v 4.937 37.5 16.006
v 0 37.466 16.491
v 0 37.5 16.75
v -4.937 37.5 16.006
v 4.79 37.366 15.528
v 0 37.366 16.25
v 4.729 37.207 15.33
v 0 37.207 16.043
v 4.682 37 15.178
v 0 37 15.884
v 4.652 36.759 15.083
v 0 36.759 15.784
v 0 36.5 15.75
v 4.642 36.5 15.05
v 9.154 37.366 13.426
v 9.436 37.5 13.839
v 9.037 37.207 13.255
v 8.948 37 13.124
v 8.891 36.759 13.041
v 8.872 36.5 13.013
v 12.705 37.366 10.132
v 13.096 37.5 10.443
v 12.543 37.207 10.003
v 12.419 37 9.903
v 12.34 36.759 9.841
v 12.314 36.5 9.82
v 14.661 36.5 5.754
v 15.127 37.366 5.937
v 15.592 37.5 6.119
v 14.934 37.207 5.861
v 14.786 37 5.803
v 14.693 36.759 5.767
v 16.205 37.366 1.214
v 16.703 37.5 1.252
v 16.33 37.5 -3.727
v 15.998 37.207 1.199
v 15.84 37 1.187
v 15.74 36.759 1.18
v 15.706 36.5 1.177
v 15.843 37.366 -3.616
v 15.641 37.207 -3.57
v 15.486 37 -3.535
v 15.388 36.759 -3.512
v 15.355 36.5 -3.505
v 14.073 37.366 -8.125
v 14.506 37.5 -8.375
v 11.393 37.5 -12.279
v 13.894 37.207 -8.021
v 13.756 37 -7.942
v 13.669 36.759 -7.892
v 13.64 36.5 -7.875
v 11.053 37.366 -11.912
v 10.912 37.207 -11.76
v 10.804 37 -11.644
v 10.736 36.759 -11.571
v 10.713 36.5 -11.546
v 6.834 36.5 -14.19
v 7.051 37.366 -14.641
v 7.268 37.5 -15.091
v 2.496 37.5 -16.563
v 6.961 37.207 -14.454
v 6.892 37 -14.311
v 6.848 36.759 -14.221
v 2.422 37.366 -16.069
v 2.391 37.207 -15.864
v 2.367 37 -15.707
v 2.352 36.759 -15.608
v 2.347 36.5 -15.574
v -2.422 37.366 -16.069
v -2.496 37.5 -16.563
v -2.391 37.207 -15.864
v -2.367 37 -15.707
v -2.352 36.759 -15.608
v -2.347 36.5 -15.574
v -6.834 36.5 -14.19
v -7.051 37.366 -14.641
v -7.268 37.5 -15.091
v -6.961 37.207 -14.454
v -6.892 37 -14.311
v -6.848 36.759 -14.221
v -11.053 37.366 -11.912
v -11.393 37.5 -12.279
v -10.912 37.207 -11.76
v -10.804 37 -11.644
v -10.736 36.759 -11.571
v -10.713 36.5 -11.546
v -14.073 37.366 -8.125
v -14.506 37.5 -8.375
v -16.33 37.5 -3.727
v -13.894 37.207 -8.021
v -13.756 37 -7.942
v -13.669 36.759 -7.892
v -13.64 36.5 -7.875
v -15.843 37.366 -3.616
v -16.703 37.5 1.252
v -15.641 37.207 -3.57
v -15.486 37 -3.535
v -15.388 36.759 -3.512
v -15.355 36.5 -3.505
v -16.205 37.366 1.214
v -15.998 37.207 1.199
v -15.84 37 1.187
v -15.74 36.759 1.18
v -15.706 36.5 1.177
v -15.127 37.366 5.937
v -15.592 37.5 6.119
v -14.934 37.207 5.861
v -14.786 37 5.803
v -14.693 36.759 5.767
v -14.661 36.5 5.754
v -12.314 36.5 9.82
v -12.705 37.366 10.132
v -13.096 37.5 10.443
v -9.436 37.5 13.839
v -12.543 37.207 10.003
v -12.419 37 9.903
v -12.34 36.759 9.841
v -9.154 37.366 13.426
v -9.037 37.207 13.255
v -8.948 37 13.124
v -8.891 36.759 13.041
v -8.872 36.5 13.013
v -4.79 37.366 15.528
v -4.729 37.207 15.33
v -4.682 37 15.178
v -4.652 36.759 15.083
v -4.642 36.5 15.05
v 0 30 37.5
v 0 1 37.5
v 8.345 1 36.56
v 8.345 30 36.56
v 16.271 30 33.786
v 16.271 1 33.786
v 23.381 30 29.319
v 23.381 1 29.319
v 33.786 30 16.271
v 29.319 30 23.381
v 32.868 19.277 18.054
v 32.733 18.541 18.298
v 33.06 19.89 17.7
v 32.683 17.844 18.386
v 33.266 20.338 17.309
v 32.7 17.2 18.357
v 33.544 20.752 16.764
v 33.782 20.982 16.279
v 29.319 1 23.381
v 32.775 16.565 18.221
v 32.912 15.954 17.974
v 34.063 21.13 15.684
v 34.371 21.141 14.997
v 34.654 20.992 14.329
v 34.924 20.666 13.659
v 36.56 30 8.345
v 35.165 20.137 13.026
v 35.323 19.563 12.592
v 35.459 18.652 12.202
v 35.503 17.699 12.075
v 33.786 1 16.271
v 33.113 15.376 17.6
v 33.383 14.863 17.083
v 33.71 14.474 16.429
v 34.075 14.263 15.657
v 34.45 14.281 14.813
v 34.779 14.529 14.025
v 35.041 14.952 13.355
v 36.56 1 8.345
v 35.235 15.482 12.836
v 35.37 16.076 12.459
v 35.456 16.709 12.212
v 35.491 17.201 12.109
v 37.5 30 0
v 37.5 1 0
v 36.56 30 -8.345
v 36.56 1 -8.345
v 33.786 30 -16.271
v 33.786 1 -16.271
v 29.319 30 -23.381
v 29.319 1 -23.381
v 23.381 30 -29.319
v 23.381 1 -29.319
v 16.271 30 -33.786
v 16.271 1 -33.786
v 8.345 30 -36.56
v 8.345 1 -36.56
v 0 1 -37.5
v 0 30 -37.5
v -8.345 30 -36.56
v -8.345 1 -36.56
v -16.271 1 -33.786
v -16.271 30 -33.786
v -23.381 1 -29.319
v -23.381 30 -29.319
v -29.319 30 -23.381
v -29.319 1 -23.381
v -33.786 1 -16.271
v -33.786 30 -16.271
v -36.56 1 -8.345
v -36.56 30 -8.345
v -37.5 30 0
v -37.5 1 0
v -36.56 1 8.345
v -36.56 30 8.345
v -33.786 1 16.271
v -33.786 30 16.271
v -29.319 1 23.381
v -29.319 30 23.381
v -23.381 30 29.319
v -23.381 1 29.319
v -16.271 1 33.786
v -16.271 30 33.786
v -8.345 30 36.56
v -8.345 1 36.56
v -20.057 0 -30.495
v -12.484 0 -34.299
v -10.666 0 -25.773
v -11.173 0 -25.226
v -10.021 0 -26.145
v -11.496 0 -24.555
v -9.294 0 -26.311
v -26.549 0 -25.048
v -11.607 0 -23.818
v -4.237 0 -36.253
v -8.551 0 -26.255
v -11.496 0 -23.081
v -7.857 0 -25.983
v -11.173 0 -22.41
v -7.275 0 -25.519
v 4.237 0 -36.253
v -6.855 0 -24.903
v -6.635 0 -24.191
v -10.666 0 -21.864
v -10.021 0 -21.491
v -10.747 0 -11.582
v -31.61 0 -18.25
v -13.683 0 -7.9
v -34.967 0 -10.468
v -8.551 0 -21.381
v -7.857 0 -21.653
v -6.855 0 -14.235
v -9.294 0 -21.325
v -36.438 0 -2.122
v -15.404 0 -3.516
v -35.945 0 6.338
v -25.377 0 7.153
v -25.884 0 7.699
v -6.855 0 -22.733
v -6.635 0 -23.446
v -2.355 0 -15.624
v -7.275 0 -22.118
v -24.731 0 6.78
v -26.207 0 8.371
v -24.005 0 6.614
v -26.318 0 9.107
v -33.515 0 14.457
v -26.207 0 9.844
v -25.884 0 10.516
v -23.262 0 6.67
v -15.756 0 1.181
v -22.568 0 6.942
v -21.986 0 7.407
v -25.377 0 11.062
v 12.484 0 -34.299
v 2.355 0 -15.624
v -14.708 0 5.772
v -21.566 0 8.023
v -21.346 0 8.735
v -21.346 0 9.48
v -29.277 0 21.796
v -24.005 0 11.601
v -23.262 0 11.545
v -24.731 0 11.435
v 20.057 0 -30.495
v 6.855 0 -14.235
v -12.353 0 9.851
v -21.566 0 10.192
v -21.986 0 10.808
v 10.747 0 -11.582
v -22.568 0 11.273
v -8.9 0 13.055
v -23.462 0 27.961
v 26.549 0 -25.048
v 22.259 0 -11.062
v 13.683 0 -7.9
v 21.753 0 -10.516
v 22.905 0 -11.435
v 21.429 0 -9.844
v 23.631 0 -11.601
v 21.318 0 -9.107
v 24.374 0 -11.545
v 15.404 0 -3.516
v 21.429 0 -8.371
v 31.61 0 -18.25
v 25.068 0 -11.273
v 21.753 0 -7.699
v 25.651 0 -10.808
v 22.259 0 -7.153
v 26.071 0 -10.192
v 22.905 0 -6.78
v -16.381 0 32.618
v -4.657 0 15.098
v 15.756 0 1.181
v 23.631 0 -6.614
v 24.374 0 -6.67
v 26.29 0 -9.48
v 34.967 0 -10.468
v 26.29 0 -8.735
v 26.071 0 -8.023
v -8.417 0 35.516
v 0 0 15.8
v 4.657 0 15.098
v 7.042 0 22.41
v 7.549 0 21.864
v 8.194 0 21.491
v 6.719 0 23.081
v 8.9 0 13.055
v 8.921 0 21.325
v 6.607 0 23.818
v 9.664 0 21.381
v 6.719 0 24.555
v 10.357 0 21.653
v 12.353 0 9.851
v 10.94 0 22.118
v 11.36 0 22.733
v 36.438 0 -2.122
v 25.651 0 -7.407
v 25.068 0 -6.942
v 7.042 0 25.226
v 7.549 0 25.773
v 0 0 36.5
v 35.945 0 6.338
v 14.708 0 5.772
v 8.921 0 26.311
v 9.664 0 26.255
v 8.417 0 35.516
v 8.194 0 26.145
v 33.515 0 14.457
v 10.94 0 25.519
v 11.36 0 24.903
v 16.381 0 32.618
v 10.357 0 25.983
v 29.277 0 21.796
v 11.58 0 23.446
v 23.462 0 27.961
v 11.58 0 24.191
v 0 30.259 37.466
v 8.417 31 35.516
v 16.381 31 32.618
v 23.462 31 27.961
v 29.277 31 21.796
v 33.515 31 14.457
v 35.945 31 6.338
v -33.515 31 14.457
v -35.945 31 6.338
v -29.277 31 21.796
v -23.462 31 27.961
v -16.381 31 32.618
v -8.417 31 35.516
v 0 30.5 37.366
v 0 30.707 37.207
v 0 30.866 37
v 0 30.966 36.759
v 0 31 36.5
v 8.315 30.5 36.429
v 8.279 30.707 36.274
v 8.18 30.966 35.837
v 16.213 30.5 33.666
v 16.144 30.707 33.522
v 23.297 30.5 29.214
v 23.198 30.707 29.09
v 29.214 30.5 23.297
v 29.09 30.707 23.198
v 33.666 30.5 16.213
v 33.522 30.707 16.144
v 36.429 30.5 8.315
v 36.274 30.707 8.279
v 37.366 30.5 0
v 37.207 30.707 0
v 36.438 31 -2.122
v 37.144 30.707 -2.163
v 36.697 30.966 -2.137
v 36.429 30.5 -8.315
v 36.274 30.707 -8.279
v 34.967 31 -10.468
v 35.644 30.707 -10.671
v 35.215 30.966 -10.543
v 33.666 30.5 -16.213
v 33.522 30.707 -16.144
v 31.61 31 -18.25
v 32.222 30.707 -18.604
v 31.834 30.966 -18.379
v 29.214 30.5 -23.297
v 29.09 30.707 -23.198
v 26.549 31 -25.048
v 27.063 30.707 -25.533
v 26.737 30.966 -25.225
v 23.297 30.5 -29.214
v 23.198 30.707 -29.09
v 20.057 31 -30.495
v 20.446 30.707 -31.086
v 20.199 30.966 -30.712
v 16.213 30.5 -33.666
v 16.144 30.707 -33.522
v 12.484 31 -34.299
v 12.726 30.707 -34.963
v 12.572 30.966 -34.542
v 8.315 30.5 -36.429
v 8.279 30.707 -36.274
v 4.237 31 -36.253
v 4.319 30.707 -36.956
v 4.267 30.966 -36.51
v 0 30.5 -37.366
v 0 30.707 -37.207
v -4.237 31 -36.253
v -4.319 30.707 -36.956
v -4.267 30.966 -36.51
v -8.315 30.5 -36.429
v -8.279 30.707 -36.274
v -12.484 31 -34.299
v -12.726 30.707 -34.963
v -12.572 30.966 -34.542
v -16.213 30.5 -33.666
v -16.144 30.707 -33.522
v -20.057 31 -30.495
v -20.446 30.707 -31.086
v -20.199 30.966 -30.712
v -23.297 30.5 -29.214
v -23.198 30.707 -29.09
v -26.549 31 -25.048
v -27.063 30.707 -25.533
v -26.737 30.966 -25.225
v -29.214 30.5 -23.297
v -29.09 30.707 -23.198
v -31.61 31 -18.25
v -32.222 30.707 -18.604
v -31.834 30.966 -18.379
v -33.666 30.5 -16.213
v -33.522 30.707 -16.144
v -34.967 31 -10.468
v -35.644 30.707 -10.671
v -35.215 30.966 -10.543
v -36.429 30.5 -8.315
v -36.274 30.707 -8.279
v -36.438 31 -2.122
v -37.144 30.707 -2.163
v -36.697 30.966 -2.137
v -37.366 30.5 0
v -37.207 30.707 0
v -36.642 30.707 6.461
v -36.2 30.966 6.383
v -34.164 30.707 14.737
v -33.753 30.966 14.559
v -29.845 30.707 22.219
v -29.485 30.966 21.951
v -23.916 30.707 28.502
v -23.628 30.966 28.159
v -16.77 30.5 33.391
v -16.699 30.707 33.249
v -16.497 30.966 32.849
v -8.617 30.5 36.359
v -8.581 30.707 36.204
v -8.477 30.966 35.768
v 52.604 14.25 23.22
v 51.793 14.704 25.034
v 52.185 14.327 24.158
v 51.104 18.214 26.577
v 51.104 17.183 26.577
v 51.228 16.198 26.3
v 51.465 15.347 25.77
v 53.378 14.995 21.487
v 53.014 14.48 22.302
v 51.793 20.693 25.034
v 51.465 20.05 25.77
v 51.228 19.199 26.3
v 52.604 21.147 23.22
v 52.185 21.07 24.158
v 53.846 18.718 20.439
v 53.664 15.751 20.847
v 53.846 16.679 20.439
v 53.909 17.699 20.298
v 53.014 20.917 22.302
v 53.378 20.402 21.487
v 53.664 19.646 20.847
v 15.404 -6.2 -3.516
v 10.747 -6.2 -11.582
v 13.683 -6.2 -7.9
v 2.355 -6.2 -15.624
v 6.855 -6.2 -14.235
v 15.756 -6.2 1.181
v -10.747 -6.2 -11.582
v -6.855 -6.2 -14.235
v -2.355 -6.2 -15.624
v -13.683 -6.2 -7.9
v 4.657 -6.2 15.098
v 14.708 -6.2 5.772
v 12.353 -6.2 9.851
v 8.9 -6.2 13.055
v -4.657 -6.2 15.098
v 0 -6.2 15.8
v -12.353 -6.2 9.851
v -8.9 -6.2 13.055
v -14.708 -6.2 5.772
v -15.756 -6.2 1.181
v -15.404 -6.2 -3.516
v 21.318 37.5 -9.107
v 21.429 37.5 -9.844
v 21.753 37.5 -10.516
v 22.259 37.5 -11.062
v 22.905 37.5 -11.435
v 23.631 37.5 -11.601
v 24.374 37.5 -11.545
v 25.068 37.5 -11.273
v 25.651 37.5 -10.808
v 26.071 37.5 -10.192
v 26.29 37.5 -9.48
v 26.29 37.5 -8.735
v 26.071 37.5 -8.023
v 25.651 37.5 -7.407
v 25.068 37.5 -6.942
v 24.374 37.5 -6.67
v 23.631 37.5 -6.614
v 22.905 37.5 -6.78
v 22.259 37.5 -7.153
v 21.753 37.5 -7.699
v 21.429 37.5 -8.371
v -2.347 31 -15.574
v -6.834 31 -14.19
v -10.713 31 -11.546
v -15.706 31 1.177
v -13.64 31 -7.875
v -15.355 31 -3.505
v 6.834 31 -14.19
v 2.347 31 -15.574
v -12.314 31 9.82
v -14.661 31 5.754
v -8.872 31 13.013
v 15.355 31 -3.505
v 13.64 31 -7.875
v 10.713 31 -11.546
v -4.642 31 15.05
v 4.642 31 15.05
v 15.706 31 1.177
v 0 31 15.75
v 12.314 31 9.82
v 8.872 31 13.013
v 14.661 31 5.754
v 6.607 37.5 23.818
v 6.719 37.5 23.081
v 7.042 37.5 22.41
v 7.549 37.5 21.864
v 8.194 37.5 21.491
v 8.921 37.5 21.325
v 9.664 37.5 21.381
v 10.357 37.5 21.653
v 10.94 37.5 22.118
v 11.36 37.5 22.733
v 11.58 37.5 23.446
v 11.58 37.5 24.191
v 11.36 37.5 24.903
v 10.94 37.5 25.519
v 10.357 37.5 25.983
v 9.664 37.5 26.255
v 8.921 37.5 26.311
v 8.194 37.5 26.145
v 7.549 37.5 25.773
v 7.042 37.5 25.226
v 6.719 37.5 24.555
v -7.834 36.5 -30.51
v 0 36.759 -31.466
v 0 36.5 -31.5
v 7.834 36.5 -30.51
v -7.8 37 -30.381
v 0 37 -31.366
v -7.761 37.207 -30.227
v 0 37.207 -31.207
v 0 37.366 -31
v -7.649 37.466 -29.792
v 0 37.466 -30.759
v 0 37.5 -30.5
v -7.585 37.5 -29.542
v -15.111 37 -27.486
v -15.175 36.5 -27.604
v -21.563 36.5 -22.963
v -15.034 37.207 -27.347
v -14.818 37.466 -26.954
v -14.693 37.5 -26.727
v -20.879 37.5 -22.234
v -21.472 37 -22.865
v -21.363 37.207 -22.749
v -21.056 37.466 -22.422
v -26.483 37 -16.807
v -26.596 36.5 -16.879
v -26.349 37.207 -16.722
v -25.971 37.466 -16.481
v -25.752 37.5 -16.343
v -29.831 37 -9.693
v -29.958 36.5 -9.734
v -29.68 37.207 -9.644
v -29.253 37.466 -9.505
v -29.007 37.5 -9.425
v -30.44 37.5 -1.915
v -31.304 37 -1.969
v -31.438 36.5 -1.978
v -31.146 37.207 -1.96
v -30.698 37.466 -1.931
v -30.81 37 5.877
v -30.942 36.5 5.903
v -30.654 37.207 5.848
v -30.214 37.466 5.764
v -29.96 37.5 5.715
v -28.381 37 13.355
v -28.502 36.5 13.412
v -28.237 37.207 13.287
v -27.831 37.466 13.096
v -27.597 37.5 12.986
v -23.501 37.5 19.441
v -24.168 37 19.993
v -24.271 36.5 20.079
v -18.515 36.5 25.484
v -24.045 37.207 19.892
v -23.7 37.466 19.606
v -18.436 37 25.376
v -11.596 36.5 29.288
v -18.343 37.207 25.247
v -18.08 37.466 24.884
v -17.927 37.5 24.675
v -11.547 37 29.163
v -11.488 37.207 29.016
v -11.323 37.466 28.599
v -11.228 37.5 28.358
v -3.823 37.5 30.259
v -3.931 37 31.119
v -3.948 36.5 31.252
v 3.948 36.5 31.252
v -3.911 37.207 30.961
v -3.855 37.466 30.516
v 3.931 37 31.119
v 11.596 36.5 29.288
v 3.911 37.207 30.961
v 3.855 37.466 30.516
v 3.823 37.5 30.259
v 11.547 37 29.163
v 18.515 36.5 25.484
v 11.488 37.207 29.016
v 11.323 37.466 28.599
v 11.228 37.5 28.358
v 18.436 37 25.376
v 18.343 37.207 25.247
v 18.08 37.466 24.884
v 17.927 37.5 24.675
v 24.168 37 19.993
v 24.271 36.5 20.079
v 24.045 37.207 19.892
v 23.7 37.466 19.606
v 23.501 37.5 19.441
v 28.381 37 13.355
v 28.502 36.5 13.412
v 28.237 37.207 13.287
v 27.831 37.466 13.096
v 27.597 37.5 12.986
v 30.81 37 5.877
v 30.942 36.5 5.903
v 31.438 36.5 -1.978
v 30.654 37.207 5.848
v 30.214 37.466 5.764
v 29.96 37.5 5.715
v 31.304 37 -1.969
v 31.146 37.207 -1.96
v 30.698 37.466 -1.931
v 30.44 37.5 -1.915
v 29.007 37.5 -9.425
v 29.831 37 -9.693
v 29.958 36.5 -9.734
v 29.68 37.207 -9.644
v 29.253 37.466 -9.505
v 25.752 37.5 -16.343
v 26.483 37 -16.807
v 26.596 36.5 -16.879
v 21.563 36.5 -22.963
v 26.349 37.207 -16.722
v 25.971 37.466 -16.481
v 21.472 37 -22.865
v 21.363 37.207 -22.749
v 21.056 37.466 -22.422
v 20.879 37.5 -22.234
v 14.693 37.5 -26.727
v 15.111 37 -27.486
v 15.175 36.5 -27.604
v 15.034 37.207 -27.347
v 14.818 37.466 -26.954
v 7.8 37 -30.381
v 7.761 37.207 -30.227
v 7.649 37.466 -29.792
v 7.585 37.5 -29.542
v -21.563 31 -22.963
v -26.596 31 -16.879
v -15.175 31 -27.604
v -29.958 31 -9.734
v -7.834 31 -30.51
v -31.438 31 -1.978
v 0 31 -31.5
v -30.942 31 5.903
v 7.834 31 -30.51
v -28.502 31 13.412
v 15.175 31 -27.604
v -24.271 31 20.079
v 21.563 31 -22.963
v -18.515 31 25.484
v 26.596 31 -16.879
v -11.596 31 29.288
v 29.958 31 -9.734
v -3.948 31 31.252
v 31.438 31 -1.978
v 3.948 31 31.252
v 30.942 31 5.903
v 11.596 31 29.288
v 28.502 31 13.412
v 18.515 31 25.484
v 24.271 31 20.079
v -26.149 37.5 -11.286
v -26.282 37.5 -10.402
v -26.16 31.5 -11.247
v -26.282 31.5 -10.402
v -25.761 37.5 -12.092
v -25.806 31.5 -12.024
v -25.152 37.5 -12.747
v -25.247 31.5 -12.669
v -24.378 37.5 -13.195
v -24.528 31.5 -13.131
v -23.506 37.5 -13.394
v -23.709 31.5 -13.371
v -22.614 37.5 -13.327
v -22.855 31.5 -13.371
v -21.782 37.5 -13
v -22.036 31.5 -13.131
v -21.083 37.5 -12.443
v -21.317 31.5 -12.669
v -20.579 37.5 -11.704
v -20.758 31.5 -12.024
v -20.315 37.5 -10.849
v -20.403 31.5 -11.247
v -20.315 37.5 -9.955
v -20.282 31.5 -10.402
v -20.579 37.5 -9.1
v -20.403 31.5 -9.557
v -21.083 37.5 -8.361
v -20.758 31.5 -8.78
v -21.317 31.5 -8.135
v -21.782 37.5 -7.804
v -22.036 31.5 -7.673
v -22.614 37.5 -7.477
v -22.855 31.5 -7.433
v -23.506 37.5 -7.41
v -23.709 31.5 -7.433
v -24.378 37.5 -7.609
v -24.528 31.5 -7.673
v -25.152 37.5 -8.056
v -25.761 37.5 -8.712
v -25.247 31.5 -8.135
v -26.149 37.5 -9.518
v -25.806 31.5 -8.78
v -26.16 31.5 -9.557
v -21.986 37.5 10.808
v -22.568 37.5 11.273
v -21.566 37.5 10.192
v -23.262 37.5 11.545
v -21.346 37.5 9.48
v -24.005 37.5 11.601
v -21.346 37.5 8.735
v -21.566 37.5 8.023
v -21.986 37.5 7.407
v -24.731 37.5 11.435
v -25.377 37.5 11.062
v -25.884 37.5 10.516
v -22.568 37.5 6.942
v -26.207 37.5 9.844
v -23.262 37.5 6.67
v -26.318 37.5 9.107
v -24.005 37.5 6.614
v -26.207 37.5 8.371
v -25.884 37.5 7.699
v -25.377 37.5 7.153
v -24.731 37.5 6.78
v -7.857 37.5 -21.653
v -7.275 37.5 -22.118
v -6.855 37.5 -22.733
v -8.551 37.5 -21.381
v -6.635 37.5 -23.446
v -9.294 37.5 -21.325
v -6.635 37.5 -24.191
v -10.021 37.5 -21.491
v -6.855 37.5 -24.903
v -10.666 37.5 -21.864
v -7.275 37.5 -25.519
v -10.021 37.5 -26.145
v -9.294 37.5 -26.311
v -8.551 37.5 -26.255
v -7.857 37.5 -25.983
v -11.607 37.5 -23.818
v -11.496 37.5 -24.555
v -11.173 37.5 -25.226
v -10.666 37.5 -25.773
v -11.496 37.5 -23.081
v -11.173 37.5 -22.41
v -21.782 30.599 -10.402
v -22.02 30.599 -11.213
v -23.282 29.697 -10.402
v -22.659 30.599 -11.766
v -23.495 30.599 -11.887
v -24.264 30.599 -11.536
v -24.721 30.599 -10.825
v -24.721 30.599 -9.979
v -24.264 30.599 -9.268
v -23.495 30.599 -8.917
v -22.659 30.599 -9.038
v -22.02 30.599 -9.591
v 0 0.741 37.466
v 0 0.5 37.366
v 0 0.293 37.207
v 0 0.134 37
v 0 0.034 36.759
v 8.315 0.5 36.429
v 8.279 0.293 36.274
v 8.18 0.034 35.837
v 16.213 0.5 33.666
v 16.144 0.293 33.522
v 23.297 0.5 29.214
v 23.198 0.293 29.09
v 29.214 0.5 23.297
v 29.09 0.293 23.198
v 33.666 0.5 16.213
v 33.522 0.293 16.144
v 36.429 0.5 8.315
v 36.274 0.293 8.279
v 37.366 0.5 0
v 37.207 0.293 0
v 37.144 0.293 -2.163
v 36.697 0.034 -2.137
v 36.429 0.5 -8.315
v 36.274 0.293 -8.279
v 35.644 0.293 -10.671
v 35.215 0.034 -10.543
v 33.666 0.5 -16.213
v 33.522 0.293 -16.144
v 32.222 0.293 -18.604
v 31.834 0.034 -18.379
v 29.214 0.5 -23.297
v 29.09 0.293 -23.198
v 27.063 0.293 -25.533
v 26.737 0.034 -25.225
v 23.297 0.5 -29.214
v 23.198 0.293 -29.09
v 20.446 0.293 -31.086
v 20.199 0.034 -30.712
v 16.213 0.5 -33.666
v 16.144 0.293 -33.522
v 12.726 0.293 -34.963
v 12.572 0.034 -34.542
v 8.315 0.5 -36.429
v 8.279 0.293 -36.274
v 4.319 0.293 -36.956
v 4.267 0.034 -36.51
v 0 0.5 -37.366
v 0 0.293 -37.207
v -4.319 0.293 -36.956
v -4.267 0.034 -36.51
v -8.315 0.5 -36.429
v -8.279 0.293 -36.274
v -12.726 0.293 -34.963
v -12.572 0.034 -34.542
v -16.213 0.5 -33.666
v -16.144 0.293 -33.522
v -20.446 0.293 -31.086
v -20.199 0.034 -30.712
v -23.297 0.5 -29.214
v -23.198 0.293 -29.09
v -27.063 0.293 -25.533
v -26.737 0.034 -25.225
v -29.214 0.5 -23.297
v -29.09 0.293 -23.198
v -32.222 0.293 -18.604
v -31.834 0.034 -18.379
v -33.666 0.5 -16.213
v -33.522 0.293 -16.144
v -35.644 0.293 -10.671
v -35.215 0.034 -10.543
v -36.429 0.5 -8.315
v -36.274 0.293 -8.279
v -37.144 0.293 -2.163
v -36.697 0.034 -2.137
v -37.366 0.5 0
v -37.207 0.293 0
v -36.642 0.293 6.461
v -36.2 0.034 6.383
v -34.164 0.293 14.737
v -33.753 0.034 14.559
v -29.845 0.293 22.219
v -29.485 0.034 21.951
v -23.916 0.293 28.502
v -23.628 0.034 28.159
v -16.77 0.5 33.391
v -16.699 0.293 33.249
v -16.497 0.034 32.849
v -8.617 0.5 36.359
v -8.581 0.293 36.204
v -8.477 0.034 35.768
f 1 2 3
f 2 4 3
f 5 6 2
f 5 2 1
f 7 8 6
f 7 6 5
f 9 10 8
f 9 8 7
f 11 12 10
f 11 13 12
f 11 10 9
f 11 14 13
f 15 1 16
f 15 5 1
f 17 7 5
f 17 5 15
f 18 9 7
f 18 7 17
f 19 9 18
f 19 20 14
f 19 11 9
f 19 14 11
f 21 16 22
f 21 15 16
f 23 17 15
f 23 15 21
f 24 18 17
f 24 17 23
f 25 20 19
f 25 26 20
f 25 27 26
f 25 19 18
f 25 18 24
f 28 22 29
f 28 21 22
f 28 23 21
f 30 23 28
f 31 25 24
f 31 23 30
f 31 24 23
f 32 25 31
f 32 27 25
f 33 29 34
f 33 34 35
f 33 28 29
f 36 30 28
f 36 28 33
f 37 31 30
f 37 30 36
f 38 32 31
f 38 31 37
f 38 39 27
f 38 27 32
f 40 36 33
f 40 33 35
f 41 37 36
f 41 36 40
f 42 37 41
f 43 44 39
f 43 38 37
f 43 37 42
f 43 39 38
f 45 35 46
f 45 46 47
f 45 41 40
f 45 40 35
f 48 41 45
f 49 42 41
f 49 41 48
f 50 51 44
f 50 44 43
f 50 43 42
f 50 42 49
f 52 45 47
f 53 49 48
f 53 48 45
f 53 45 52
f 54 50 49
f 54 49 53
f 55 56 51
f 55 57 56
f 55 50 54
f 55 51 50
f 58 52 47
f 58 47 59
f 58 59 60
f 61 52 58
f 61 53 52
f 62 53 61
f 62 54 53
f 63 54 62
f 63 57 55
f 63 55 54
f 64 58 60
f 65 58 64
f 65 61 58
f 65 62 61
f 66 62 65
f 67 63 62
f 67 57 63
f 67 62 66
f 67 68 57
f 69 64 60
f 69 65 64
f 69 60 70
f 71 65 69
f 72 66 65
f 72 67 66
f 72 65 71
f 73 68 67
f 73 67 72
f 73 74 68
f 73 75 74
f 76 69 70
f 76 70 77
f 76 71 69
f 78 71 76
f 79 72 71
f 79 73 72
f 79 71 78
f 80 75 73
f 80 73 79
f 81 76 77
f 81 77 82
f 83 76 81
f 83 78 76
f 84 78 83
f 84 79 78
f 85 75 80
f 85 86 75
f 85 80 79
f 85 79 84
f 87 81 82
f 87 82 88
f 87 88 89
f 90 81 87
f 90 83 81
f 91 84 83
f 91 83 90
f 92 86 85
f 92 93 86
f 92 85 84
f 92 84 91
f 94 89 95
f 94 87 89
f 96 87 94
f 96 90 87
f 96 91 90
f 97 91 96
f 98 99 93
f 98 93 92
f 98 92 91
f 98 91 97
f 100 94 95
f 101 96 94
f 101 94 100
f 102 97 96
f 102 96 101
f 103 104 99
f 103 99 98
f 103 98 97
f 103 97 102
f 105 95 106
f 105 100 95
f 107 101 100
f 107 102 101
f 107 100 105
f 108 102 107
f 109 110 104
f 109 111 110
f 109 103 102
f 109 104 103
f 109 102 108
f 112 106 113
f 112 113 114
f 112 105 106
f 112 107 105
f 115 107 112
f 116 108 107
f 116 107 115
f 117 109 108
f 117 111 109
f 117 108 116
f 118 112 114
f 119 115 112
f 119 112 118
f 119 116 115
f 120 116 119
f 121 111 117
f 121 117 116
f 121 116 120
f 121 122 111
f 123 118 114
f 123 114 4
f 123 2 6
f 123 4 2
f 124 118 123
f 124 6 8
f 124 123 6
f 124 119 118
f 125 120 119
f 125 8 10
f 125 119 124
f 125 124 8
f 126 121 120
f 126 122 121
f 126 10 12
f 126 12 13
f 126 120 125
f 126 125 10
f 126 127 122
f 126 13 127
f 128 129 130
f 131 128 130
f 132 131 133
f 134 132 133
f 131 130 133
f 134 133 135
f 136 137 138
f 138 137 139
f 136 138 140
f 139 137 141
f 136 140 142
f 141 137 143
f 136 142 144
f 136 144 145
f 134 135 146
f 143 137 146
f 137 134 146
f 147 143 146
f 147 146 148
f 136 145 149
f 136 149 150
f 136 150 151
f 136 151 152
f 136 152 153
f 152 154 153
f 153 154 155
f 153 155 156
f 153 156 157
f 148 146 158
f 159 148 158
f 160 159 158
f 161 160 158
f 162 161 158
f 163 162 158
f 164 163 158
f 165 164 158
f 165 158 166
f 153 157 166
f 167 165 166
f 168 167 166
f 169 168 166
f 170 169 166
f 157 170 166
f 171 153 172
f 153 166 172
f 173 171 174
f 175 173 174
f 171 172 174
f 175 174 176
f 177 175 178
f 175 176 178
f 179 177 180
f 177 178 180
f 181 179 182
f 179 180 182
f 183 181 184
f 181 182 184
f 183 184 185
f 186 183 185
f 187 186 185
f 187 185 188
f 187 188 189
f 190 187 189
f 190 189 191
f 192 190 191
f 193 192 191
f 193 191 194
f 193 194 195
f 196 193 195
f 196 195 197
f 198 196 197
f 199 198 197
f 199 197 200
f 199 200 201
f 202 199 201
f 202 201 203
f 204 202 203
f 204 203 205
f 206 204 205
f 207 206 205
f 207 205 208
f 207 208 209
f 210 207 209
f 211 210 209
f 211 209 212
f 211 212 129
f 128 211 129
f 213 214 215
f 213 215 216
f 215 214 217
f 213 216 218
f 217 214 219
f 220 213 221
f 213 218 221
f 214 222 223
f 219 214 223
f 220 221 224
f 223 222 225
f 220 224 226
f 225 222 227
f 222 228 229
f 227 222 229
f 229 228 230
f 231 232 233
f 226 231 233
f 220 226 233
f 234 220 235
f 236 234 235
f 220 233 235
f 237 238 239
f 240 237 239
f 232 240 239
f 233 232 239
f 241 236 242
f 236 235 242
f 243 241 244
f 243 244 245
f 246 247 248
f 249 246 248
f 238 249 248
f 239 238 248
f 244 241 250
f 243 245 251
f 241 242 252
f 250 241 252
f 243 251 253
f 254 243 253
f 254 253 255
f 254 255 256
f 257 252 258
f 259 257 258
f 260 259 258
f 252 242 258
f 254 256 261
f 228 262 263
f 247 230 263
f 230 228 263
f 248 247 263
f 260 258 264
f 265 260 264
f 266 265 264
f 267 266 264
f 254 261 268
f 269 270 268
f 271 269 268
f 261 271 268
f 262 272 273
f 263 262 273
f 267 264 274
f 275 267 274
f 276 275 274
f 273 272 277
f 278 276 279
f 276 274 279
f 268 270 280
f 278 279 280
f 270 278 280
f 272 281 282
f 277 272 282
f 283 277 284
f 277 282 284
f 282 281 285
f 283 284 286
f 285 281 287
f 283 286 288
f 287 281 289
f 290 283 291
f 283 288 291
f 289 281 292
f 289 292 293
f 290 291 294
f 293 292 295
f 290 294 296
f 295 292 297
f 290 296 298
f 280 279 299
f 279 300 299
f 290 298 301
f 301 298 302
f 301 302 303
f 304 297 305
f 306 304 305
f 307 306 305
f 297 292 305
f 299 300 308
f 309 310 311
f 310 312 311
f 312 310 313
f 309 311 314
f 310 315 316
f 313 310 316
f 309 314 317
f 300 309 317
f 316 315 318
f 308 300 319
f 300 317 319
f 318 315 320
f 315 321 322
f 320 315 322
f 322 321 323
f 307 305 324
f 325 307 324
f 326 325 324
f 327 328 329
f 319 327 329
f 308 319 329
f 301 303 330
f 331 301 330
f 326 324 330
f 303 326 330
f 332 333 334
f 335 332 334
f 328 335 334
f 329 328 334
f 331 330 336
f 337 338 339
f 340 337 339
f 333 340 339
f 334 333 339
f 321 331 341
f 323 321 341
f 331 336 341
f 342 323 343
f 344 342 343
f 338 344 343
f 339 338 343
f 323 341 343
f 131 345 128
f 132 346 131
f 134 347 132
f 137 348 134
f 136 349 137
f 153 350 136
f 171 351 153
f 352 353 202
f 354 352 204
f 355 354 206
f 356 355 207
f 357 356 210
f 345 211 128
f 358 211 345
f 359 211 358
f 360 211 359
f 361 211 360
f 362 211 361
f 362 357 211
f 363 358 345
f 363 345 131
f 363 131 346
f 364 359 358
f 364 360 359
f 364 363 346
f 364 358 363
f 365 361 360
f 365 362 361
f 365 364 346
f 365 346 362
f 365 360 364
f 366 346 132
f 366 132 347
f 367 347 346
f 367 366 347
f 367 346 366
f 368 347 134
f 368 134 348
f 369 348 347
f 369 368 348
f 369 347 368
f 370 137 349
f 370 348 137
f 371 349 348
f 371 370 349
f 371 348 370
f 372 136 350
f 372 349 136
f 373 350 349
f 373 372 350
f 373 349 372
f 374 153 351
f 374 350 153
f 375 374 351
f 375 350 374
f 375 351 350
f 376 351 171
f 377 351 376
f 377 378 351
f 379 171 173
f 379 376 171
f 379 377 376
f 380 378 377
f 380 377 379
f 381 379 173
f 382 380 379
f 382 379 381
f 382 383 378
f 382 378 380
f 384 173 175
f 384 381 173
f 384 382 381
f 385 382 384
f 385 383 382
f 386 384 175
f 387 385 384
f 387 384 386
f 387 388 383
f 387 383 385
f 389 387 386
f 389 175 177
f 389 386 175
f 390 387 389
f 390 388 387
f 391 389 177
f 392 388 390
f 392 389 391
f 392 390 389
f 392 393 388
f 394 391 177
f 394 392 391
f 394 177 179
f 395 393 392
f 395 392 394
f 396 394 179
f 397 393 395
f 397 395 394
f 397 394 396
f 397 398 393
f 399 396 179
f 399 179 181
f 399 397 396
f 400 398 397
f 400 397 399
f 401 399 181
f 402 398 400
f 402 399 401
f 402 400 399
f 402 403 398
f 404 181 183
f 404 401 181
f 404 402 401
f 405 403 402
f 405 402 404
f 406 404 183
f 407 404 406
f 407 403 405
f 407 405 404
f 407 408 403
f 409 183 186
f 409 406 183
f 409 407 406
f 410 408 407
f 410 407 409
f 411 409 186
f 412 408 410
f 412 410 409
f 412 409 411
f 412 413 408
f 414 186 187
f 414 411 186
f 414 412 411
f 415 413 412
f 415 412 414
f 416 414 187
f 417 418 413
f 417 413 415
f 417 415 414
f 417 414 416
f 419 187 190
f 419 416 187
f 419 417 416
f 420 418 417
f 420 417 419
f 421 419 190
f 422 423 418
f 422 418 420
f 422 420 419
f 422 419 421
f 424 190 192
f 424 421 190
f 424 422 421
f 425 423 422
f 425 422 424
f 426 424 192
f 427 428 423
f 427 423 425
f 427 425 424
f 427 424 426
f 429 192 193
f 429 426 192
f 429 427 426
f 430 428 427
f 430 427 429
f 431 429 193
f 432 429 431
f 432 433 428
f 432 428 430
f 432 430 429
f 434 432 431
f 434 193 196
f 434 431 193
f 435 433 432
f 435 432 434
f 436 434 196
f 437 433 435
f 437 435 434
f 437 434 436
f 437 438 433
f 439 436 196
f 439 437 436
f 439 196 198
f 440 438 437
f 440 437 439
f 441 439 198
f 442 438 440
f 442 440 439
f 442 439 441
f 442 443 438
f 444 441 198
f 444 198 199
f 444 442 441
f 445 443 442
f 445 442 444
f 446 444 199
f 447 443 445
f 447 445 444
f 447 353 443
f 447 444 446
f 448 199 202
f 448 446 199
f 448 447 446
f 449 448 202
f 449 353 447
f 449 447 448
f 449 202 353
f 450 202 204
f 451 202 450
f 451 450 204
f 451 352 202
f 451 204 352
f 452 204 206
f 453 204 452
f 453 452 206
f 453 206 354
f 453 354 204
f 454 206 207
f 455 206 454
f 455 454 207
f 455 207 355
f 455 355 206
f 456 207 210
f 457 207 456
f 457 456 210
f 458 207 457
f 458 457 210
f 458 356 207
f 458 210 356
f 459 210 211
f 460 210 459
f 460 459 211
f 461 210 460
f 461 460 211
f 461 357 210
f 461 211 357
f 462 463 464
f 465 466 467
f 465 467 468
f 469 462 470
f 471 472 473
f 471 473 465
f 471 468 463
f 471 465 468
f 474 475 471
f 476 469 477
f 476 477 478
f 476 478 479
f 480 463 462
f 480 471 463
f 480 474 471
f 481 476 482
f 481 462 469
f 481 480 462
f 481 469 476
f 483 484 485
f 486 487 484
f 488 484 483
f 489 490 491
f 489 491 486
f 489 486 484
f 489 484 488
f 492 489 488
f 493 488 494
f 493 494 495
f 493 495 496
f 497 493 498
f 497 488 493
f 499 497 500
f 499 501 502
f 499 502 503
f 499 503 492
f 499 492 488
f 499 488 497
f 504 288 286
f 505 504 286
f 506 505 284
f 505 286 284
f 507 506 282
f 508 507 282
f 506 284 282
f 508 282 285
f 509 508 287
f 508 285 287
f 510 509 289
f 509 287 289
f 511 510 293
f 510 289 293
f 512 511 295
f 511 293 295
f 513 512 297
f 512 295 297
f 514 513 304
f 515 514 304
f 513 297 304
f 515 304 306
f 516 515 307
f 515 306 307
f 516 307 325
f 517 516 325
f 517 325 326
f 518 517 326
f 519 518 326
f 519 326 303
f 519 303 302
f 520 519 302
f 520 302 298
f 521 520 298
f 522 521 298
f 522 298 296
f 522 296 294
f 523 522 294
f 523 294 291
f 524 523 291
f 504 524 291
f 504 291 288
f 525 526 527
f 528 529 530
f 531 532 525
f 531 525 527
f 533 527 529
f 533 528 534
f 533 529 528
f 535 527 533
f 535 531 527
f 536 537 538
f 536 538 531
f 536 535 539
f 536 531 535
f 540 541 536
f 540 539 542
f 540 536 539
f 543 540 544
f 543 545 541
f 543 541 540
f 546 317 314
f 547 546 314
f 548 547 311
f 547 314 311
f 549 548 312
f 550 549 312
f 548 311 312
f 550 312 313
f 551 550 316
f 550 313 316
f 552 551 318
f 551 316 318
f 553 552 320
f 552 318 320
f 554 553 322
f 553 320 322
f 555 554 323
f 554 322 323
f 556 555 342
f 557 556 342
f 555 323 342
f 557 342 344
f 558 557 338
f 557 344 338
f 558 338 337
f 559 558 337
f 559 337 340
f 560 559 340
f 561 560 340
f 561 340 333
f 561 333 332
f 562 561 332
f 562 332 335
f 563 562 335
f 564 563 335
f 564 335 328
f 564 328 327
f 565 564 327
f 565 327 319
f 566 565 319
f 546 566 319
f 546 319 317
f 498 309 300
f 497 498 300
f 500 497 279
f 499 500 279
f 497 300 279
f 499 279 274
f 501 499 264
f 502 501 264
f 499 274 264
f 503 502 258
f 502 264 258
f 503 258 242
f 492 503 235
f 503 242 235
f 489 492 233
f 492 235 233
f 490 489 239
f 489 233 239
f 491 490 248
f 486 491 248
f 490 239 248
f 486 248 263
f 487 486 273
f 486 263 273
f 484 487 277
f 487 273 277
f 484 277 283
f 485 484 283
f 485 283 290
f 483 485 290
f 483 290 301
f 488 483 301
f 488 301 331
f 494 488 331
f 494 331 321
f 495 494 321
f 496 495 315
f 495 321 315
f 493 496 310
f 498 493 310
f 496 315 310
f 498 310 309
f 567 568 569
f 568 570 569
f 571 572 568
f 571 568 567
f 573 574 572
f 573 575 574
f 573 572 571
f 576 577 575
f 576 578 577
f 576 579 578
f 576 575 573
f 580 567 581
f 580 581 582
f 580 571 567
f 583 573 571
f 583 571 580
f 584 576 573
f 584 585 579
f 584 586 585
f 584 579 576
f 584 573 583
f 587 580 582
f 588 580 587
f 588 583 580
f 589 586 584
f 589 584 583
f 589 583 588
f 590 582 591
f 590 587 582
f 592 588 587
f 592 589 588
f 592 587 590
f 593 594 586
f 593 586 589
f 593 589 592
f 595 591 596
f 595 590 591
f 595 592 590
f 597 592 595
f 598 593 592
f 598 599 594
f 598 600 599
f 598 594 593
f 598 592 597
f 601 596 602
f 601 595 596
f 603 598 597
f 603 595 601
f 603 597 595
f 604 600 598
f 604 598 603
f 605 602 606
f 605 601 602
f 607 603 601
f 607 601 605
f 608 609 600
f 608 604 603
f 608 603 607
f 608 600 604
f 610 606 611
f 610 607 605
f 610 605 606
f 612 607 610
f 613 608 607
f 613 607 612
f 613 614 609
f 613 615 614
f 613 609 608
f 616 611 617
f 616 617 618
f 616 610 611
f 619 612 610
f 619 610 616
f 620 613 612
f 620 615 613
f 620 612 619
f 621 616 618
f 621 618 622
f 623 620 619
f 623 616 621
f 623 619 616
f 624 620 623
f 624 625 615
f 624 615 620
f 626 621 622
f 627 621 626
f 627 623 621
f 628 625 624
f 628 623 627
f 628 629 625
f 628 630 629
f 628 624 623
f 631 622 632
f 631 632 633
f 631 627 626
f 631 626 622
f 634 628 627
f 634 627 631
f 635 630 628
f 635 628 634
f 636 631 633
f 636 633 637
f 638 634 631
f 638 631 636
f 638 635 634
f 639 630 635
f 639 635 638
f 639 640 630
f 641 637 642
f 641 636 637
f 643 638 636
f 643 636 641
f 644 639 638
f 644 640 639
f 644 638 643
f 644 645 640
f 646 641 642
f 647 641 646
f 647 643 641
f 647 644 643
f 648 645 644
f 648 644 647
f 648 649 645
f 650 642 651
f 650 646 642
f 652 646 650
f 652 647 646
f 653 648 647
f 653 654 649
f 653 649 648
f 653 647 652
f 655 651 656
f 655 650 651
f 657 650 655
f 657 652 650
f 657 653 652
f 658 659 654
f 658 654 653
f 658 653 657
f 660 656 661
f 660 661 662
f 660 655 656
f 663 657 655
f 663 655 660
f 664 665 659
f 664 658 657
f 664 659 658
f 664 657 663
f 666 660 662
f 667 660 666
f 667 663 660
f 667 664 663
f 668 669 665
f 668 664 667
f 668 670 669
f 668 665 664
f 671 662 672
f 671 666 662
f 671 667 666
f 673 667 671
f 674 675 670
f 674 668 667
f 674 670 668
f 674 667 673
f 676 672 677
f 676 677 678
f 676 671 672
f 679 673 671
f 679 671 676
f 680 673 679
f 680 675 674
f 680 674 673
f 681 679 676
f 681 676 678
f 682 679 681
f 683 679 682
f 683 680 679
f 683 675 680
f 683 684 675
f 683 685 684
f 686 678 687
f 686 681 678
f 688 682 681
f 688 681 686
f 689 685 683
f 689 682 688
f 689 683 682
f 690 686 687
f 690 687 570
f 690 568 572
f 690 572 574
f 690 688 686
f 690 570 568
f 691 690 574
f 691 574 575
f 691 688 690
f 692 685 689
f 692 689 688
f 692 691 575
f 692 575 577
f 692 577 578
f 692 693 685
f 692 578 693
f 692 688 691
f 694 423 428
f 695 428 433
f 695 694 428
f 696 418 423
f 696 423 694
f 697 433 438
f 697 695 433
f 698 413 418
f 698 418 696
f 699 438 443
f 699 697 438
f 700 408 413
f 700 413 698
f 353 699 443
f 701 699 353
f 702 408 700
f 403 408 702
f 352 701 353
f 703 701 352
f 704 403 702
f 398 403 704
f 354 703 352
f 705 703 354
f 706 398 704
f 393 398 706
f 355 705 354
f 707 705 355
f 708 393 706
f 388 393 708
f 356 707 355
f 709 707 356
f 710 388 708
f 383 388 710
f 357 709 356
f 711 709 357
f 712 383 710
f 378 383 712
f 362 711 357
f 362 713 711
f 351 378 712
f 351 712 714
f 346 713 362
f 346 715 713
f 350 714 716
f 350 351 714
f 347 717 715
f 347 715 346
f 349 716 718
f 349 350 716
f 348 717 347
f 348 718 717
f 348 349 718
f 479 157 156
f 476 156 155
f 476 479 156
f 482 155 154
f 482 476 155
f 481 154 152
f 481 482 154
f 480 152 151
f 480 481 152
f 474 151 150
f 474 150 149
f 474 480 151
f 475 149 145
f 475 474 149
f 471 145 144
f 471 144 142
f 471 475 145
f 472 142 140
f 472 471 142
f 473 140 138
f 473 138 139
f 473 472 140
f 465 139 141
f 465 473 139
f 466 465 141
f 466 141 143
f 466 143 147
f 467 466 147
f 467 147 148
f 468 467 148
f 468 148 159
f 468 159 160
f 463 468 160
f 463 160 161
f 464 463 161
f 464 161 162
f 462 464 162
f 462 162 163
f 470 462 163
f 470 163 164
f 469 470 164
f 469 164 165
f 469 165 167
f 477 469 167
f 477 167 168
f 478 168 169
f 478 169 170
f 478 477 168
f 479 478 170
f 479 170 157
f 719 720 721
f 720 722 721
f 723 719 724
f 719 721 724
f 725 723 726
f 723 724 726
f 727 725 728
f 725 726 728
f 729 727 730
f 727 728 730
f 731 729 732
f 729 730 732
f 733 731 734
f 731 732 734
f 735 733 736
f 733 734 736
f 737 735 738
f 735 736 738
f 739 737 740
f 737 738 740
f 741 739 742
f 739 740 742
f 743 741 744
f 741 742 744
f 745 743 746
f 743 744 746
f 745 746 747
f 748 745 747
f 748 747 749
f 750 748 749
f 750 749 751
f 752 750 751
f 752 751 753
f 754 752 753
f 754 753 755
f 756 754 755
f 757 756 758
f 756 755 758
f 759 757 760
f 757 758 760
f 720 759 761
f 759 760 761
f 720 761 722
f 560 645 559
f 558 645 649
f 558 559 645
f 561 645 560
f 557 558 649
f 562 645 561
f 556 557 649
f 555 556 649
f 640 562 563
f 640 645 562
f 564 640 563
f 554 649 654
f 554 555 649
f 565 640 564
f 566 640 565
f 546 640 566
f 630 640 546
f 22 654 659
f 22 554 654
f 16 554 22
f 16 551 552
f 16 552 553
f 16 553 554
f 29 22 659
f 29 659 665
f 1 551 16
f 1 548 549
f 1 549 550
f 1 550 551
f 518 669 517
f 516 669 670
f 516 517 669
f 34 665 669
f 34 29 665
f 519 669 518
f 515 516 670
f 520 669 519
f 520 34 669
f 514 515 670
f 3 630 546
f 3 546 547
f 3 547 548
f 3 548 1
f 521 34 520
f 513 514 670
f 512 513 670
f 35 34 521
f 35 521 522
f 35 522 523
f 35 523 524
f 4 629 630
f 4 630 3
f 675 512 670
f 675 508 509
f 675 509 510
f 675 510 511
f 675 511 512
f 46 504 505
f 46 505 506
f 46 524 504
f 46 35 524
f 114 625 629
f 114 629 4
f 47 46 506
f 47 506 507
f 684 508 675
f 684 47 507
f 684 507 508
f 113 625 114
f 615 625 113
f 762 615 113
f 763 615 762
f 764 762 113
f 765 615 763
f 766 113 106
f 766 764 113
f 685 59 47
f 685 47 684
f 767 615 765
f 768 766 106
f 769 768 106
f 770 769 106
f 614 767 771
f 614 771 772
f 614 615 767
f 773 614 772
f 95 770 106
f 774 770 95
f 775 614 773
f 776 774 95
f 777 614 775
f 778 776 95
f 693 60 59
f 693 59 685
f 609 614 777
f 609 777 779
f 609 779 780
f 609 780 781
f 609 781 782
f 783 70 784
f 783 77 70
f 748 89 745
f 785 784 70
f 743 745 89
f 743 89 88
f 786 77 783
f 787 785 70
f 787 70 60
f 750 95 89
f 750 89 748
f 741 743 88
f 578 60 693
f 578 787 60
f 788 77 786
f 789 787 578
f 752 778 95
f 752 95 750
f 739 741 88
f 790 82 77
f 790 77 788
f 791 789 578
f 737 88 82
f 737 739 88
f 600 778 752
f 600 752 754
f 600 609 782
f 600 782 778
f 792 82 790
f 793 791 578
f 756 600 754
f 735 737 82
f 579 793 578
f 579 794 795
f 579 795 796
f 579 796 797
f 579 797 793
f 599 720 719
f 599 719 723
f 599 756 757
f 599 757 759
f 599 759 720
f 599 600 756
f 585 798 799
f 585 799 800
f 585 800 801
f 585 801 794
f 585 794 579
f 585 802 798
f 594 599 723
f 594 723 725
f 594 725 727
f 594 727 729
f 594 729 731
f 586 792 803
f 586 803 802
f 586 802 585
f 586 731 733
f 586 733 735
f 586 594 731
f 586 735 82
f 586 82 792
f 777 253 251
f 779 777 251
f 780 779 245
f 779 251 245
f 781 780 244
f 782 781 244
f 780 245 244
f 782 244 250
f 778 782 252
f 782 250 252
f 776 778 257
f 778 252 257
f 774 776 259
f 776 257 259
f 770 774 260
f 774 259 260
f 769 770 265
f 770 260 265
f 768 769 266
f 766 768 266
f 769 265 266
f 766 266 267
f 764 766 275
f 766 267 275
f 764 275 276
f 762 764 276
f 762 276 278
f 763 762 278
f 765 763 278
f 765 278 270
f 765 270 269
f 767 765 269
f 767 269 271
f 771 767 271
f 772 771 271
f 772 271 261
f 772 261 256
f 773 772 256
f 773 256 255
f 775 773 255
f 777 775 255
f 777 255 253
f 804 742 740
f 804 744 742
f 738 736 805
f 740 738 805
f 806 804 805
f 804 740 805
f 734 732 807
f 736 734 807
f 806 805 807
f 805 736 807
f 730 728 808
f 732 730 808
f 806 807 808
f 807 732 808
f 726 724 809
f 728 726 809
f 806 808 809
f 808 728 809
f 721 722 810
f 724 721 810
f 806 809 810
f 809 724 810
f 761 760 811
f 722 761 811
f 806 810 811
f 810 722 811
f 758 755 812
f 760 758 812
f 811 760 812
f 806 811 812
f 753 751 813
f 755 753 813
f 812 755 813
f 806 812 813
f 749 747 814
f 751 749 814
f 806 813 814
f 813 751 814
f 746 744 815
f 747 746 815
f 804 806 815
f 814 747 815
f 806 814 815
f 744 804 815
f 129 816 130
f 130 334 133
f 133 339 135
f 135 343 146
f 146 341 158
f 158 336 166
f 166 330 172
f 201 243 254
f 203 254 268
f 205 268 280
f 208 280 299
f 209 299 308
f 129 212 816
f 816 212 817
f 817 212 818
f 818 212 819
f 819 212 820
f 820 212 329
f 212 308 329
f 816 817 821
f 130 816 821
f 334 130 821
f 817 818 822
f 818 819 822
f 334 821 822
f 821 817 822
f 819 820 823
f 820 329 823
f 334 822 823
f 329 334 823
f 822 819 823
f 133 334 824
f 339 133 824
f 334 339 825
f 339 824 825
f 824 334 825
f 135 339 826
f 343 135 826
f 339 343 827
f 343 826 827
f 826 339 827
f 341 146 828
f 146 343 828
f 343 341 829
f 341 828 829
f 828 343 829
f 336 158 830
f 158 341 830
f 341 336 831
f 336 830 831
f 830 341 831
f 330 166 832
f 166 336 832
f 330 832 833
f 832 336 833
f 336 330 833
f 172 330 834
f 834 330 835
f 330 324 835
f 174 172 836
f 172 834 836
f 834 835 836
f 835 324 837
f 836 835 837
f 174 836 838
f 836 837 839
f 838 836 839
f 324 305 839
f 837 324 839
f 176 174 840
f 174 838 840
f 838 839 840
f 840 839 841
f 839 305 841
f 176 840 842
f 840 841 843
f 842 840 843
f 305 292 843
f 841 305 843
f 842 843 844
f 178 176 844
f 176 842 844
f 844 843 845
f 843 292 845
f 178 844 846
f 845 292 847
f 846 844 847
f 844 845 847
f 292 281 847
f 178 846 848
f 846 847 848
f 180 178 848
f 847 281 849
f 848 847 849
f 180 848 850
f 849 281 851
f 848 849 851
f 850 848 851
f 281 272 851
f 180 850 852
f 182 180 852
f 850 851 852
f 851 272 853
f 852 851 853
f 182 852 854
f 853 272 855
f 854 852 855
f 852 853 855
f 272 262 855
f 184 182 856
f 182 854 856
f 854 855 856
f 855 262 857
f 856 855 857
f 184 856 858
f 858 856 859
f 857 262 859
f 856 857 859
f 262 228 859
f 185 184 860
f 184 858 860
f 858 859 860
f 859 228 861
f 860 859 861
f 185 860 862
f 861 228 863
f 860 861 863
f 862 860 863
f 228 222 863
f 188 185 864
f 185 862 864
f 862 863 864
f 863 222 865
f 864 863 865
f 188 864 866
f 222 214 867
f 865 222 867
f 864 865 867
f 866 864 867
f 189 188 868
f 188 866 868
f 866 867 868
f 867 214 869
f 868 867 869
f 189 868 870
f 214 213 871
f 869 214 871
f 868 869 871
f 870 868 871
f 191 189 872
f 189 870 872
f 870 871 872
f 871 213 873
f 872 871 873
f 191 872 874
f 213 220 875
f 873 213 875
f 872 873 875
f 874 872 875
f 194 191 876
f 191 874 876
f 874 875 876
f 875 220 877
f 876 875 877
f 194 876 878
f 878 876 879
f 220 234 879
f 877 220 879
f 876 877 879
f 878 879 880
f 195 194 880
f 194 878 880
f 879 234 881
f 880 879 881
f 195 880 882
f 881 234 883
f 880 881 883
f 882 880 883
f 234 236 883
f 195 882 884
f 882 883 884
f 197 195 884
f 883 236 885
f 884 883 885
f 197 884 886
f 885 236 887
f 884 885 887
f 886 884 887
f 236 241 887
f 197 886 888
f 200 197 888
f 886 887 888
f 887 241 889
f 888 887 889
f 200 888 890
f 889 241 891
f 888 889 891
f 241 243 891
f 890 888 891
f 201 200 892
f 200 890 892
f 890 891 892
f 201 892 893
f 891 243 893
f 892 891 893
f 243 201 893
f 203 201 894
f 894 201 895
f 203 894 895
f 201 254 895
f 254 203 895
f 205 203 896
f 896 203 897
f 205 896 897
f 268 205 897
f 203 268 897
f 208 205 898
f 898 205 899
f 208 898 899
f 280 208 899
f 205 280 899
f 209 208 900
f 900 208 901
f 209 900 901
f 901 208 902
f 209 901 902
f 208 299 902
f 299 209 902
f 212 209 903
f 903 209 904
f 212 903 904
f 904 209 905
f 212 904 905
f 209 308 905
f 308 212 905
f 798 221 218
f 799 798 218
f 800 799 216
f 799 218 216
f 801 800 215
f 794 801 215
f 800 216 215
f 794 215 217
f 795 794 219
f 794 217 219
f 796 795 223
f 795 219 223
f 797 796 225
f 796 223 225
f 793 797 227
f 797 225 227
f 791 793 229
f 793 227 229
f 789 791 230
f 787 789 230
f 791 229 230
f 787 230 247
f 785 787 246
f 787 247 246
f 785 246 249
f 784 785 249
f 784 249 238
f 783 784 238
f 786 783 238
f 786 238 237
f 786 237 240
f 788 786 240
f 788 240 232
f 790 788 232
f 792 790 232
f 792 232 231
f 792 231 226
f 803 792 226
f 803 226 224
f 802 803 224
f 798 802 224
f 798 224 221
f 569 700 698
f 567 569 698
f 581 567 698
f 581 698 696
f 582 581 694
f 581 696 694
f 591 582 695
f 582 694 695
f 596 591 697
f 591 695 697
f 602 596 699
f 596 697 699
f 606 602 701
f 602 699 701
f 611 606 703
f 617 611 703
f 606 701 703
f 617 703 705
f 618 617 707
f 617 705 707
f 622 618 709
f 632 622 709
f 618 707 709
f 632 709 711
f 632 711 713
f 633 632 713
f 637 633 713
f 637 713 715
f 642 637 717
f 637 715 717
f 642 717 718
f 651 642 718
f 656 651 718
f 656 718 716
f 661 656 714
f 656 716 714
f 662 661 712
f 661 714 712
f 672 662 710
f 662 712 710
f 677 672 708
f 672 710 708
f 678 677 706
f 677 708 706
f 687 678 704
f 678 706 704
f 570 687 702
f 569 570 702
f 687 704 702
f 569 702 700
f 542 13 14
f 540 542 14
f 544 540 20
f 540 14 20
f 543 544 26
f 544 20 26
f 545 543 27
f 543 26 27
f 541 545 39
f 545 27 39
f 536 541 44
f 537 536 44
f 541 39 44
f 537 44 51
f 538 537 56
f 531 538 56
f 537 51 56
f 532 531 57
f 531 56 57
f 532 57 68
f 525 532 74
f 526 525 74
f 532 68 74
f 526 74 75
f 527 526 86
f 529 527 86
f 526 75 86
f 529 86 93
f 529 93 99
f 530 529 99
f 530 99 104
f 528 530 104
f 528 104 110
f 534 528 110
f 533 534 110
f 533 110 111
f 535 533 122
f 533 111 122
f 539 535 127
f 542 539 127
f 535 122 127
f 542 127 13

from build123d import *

# Parameters (mm, degrees)
SKETCH_1_R           = 37.5
EXTRUDE_1_DEPTH      = 31
SKETCH_2_R           = 31.5
EXTRUDE_2_DEPTH      = 6.5
SKETCH_3_R           = 15.75
CUT_EXTRUDE_1_DEPTH  = 6.5
SKETCH_4_R           = 15.8
EXTRUDE_3_DEPTH      = 6.2
HOLE_WIZARD_M6_1_D   = 5
MM_1_D               = 6
MM_1_DEPTH           = 6
MM_1_TIP             = 1.802581857
EXTRUDE_4_REACH      = 116.985
EXTRUDE_4_END_RADIUS = 37.5
SKETCH_16_R          = 3.457756213
FILLET_2_R           = 1


with BuildPart() as part:
    # 草图1 → 凸台-拉伸1 (new body)
    with BuildSketch(Plane(origin=(0, 0, 0), x_dir=(1, 0, 0), z_dir=(0, 1, 0))):
        with Locations(Location((0, 0, 0), (0, 0, 270))):
            Circle(SKETCH_1_R)
    extrude(amount=EXTRUDE_1_DEPTH)

    # 草图2 → 凸台-拉伸2 (add)
    with BuildSketch(Plane(origin=(0, 31, 0), x_dir=(1, 0, 0), z_dir=(0, 1, 0))):
        with Locations(Location((0, 0, 0), (0, 0, 90))):
            Circle(SKETCH_2_R)
    extrude(amount=EXTRUDE_2_DEPTH)

    # 草图3 → 切除-拉伸1 (cut)
    with BuildSketch(Plane(origin=(0, 37.5, 0), x_dir=(1, 0, 0), z_dir=(0, 1, 0))):
        with Locations(Location((0, 0, 0), (0, 0, 270))):
            Circle(SKETCH_3_R)
    extrude(amount=-CUT_EXTRUDE_1_DEPTH, mode=Mode.SUBTRACT)

    # 草图4 → 凸台-拉伸3 (add)
    with BuildSketch(Plane.XZ):
        with Locations(Location((0, 0, 0), (0, 0, 90))):
            Circle(SKETCH_4_R)
    extrude(amount=EXTRUDE_3_DEPTH)

    # M6 螺纹孔1 (through all)
    with Locations(Plane(origin=(0, 37.5, 0), x_dir=(1, 0, 0), z_dir=(0, 1, 0))):
        with Locations((-23.818134331, -9.107495647), (9.107495647, -23.818134331), (23.818134331, 9.107495647), (-9.107495647, 23.818134331)):
            Hole(HOLE_WIZARD_M6_1_D / 2)

    # 大小mm 暗销孔1
    with Locations(Plane(origin=(0, 37.5, 0), x_dir=(1, 0, 0), z_dir=(0, 1, 0))):
        with Locations((-23.281936233, 10.401992369)):
            Hole(MM_1_D / 2, depth=MM_1_DEPTH)
            with Locations((0, 0, -(MM_1_DEPTH + MM_1_TIP / 2))):  # 118° drill point
                Cone(0, MM_1_D / 2, MM_1_TIP, mode=Mode.SUBTRACT)

    # 凸台-拉伸4: up to this cylinder (the profile starts outside it)
    extrude_4_end = Plane(origin=(0, 17.698511, 0), z_dir=(0, -1, 0)) * Cylinder(EXTRUDE_4_END_RADIUS, 309.97, mode=Mode.PRIVATE)
    # 草图16 → 凸台-拉伸4 (add, up to the surface)
    with BuildSketch(Plane(origin=(52.498483662, 0, 23.455472989), x_dir=(0.4079212693781409, 0, -0.9130171071721089), z_dir=(0.9130171071721089, 0, 0.4079212693781409)), mode=Mode.PRIVATE) as extrude_4_sk1:
        with Locations((0, 17.698511035)):
            Circle(SKETCH_16_R)
    extrude_4_tool1 = extrude(extrude_4_sk1.sketch, amount=-EXTRUDE_4_REACH, mode=Mode.PRIVATE) - extrude_4_end
    add(extrude_4_tool1.solids().sort_by_distance((52.498484, 17.698511, 23.455473))[0])

    # 圆角2
    fillet_2_edges = [part.edges().sort_by_distance(p)[0] for p in [
        (0, 37.5, -15.75),
        (0, 0, -37.5),
        (0, 31, -37.5),
        (0, 37.5, 31.5),
    ]]
    fillet(fillet_2_edges, radius=FILLET_2_R)


solid = part.part
